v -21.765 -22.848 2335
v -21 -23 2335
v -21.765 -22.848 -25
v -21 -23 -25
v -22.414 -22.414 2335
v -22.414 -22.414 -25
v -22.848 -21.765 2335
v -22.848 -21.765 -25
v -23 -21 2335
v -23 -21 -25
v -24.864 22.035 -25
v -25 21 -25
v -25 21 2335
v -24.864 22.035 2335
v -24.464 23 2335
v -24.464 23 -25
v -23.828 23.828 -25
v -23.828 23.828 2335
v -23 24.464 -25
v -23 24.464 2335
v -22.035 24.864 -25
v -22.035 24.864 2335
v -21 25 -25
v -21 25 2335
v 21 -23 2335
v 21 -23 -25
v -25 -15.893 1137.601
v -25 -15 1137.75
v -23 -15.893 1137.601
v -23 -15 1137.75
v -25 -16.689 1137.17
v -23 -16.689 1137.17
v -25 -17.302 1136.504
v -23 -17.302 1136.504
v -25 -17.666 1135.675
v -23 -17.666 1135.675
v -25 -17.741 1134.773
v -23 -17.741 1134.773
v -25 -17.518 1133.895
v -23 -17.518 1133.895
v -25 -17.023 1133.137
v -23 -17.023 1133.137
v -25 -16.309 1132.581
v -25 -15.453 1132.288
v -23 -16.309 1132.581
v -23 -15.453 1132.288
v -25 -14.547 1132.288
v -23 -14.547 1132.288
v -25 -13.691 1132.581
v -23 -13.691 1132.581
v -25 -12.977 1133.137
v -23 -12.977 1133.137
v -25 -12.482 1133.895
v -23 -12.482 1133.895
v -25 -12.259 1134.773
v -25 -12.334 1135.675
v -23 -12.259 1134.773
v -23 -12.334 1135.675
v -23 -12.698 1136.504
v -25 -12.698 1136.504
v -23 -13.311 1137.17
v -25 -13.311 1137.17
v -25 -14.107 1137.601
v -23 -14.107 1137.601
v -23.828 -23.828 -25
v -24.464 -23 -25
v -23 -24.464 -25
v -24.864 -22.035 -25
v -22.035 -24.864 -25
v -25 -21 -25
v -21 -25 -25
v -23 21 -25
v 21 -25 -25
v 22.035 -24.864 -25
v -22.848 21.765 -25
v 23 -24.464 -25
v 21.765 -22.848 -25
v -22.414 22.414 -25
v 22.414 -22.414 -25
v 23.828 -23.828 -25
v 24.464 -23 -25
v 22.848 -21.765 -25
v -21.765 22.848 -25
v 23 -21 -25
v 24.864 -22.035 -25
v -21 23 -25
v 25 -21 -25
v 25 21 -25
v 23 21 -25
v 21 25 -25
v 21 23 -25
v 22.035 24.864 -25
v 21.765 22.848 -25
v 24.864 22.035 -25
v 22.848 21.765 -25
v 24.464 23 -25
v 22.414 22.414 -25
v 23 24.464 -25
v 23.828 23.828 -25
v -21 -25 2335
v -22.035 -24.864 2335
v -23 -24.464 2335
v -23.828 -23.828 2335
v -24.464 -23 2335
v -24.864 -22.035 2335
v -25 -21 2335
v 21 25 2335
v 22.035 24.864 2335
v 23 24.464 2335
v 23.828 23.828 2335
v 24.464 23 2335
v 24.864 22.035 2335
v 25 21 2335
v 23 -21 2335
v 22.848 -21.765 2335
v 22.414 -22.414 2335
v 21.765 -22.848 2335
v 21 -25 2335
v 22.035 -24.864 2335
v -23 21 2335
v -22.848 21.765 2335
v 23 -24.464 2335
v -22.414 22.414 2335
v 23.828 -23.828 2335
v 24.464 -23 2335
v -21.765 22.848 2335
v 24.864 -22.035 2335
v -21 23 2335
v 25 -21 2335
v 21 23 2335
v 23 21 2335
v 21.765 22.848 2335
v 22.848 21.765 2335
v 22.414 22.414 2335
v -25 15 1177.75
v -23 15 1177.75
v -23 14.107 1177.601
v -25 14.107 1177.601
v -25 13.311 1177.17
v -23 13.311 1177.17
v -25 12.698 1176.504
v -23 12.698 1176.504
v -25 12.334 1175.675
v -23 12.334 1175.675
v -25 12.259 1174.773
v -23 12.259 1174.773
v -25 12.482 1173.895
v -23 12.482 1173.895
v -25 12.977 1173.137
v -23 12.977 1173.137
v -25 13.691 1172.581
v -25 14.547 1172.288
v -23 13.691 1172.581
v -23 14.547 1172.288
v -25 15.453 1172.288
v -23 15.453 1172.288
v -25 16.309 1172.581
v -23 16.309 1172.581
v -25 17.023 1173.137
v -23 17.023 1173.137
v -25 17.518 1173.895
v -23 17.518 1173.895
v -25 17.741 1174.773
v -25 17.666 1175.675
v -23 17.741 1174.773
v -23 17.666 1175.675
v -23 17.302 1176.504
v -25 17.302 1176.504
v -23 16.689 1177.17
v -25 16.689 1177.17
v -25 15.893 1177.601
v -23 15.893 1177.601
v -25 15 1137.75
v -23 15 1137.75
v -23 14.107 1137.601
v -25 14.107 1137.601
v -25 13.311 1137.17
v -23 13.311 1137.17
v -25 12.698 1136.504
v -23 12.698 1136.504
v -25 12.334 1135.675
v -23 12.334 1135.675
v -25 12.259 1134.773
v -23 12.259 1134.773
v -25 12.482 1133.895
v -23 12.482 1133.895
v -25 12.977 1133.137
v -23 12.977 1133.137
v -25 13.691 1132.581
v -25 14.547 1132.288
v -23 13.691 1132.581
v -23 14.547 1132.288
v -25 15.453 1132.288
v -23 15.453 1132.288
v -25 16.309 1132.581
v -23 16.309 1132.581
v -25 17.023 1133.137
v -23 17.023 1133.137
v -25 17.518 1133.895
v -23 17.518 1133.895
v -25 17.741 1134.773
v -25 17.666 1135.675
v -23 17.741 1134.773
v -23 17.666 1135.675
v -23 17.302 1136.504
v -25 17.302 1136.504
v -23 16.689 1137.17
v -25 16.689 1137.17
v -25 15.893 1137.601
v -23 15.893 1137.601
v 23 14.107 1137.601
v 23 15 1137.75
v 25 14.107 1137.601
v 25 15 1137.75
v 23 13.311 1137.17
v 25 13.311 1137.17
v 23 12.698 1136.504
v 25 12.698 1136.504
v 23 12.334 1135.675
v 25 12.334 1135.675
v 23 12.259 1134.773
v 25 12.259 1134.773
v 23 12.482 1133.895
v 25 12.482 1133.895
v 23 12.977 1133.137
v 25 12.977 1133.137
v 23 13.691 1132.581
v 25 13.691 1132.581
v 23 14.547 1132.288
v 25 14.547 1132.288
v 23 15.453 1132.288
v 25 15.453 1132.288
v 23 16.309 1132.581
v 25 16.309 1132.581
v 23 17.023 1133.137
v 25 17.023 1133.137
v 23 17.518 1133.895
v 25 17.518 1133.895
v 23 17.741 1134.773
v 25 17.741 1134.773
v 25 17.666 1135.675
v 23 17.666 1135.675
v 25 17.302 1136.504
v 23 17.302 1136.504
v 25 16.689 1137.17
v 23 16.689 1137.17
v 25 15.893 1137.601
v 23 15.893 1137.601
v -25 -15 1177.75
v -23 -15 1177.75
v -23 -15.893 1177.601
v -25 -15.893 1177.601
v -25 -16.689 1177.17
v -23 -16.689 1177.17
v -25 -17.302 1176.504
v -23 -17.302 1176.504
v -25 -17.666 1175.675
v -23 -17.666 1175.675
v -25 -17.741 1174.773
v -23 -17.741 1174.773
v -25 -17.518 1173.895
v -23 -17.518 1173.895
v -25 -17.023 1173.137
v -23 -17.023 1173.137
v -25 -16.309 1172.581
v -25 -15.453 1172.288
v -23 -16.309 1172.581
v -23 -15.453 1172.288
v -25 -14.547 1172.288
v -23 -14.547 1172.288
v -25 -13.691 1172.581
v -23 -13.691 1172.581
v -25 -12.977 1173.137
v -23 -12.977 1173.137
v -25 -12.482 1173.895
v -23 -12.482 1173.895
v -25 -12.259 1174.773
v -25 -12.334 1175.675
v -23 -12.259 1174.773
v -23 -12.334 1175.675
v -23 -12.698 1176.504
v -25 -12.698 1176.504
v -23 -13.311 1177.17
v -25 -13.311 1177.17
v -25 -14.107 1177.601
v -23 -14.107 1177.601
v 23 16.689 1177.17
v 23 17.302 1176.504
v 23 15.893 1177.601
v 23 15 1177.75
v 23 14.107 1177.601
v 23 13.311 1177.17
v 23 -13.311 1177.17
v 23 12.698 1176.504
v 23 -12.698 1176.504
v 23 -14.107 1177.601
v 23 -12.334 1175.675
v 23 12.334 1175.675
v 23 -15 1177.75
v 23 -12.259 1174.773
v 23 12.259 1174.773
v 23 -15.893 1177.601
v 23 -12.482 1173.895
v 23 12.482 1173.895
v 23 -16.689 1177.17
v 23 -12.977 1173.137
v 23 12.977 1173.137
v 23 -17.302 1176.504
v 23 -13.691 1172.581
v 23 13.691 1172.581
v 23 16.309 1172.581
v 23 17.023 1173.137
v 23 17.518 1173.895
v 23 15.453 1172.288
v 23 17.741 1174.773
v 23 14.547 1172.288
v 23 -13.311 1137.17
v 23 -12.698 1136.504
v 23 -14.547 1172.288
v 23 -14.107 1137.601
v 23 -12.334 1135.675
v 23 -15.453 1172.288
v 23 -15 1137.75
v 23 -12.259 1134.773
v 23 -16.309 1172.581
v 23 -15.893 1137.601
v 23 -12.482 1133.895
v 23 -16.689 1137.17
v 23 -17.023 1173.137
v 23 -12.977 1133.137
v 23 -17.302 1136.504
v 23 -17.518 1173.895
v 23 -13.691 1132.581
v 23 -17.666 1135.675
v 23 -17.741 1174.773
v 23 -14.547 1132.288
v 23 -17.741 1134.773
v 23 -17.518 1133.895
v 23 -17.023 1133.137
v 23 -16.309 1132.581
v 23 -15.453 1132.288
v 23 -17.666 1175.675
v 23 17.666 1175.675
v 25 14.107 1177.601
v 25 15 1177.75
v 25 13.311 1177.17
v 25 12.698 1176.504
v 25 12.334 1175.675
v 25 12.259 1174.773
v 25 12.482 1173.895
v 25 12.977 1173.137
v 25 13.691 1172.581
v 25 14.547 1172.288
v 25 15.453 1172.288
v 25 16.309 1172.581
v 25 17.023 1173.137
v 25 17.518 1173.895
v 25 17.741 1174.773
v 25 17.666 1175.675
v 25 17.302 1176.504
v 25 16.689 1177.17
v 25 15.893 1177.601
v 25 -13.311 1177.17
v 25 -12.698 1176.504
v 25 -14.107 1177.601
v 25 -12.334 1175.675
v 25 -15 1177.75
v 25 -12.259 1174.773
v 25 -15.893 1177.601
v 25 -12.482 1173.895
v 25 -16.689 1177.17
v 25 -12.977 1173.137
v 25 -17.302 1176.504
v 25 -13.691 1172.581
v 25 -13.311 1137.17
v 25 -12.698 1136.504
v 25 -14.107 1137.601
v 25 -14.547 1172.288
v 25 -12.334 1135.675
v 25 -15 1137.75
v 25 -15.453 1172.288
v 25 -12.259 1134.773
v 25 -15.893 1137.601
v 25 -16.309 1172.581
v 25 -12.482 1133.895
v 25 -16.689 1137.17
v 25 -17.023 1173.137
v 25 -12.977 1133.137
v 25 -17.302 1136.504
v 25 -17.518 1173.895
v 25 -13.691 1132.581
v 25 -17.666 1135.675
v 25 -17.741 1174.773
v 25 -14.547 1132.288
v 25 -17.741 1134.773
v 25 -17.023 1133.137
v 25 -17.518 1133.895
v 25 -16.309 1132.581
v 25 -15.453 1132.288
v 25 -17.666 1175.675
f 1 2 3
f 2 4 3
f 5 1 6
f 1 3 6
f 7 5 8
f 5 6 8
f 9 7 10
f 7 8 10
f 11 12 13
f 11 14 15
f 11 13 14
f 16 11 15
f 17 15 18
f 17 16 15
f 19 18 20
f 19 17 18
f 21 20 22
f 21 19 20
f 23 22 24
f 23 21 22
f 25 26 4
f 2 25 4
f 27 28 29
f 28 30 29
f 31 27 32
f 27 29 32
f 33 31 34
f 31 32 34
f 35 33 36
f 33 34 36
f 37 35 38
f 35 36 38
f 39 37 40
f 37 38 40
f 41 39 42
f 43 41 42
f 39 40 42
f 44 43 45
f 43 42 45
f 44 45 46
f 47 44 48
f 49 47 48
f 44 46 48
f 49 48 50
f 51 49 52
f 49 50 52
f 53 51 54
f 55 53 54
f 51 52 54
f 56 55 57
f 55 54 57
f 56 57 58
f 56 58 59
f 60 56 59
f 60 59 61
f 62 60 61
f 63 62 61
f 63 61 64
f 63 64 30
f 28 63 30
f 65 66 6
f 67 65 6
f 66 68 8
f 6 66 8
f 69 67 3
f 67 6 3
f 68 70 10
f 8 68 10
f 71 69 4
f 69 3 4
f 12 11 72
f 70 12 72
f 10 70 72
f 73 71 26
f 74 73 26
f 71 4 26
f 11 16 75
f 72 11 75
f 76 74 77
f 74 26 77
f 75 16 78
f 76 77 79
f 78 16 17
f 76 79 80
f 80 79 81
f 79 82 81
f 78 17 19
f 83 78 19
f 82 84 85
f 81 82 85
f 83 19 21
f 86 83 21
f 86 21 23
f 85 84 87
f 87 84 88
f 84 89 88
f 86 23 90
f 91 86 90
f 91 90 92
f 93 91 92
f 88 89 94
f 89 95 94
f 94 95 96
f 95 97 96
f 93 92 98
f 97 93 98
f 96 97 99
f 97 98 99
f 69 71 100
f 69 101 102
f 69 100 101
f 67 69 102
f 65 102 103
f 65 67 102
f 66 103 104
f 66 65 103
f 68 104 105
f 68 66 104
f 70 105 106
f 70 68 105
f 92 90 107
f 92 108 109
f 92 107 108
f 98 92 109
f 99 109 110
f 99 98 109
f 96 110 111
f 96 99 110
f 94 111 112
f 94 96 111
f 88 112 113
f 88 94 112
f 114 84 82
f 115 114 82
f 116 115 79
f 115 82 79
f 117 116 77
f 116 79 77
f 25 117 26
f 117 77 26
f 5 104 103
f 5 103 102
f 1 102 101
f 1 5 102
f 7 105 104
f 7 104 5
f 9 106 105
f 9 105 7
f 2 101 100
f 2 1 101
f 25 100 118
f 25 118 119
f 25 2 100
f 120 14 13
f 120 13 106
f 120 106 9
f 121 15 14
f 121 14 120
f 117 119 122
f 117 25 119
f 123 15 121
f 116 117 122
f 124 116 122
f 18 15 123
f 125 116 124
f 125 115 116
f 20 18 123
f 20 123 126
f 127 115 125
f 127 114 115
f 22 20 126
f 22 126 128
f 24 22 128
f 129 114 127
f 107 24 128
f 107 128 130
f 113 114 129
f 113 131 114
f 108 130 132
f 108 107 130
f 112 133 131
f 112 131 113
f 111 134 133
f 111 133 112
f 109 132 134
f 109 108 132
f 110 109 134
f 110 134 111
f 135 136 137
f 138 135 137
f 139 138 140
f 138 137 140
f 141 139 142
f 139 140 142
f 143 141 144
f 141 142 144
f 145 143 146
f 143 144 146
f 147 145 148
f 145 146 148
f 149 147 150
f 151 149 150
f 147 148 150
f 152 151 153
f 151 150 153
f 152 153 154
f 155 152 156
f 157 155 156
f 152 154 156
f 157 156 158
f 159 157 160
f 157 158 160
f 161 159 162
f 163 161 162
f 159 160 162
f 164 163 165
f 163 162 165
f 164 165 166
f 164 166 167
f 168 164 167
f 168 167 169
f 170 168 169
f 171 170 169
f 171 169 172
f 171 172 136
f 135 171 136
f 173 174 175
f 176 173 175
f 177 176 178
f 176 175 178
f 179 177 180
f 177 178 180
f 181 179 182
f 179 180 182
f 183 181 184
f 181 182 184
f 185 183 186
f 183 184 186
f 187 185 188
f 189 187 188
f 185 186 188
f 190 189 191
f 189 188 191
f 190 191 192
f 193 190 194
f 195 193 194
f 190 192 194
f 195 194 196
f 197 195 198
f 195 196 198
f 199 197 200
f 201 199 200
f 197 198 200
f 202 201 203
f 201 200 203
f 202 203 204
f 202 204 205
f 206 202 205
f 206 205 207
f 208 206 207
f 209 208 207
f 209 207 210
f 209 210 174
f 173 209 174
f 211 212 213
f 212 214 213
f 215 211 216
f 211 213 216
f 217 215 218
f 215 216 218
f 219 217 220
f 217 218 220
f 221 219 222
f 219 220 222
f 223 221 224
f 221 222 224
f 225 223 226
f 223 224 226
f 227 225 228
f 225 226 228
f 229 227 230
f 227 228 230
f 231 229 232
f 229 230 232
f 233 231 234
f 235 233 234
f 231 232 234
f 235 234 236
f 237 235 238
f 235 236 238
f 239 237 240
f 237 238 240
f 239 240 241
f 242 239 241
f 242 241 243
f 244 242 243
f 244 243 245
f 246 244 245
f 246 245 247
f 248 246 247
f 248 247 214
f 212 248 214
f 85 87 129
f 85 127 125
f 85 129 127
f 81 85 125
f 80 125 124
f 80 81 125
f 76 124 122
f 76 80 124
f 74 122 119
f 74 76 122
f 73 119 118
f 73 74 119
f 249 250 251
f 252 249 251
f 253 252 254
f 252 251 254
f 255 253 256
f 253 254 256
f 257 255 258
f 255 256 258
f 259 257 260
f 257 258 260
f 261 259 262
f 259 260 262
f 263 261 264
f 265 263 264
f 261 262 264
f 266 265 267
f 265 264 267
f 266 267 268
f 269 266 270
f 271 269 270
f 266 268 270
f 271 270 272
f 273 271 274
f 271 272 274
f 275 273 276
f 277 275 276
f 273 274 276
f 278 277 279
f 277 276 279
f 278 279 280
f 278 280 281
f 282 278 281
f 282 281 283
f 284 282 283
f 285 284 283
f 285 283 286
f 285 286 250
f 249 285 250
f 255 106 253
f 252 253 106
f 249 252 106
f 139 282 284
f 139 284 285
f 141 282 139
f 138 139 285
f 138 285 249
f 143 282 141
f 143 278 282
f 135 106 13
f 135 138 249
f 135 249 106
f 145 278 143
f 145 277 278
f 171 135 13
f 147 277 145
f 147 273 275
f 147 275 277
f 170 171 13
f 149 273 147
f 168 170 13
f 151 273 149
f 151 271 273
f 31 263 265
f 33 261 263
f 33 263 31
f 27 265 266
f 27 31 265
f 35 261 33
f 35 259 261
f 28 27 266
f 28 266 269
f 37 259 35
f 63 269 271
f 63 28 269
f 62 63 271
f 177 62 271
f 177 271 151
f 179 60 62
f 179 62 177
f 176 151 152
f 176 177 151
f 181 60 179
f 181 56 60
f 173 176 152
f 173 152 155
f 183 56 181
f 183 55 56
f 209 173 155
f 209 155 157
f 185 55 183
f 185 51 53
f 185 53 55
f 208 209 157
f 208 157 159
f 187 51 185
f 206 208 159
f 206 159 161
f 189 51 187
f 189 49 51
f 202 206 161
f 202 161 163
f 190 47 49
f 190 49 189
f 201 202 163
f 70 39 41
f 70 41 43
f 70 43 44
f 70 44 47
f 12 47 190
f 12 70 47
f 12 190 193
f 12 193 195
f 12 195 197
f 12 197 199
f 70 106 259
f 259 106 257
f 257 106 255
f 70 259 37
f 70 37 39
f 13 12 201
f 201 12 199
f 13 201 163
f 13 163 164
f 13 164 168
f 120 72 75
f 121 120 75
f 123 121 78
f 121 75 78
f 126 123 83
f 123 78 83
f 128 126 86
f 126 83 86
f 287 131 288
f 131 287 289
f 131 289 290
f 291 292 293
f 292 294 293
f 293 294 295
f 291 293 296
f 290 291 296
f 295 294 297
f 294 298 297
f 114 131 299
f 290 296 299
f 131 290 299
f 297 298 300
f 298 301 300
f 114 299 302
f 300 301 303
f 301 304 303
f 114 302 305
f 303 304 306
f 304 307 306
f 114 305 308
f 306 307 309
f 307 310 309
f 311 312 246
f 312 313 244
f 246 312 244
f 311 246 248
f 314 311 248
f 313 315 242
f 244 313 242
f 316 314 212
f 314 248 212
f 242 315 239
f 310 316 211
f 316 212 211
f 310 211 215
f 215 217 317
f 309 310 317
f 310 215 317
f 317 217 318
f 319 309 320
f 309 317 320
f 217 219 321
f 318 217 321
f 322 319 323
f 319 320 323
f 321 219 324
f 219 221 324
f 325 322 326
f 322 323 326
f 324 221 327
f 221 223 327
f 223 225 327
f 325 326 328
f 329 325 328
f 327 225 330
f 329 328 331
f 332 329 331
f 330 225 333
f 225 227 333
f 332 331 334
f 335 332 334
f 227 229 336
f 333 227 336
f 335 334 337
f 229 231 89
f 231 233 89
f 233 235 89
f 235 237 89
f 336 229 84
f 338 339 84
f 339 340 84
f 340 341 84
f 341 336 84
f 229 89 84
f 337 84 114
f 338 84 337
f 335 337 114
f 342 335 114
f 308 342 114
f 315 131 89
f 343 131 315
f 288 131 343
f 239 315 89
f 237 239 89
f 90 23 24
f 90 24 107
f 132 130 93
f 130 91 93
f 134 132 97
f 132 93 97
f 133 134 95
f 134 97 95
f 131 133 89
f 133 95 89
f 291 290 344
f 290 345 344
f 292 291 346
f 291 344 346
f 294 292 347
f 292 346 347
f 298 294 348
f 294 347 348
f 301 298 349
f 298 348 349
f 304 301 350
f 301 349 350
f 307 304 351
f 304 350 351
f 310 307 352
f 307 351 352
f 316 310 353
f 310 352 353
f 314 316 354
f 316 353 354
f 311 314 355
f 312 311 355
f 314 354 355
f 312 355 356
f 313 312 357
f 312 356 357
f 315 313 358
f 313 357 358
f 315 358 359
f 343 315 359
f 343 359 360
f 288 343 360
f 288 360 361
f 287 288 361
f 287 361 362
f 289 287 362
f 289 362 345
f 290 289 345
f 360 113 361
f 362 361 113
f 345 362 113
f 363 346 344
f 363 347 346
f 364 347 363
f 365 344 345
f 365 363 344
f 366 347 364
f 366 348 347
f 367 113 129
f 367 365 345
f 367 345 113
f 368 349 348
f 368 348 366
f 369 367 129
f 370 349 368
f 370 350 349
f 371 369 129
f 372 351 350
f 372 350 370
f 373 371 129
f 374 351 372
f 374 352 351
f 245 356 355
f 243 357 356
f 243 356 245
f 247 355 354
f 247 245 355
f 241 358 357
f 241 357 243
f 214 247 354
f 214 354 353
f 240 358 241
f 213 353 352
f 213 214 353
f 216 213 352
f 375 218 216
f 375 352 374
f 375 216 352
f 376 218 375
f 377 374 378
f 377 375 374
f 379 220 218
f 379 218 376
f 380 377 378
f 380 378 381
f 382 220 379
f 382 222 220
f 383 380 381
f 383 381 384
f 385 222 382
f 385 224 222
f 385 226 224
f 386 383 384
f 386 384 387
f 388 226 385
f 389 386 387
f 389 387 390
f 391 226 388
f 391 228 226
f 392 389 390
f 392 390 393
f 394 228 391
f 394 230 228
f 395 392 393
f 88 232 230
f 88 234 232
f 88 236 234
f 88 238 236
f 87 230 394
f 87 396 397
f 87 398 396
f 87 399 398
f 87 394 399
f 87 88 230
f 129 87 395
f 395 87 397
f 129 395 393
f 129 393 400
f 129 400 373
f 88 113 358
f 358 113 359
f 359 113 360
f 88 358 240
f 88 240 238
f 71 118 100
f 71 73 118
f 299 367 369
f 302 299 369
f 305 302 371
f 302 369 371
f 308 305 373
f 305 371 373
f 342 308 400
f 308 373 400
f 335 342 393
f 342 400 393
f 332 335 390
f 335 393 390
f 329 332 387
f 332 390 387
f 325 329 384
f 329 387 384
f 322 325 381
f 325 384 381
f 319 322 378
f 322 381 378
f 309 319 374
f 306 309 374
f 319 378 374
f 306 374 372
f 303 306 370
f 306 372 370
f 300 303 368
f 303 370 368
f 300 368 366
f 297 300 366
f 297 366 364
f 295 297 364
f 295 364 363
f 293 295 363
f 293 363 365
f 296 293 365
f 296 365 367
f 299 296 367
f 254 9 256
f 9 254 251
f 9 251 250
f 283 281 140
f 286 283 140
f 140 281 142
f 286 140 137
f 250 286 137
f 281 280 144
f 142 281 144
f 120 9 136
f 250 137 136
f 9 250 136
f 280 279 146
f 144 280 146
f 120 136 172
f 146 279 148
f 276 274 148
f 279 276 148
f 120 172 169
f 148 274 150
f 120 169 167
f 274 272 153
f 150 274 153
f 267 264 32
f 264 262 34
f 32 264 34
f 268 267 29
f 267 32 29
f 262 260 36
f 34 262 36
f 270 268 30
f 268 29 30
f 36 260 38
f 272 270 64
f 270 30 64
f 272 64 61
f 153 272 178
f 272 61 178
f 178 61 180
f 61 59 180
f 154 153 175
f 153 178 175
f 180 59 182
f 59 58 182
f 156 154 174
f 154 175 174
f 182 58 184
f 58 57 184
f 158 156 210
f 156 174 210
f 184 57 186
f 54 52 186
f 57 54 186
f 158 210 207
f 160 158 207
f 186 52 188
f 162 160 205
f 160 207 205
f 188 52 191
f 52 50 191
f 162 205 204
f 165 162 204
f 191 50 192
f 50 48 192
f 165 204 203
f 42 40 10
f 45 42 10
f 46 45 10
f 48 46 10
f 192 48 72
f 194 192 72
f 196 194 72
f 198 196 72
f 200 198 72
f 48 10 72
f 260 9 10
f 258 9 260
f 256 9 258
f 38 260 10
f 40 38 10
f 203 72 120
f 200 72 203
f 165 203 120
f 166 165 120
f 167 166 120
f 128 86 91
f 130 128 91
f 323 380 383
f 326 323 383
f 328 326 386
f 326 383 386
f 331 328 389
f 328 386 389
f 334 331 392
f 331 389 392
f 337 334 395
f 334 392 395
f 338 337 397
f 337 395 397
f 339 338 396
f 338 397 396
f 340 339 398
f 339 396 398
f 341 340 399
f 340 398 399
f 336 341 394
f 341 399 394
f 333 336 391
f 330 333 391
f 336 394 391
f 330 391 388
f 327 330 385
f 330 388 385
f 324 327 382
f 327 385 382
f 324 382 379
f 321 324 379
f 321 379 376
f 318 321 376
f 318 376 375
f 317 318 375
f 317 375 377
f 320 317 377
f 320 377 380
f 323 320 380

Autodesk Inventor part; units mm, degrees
ref_plane "Start plane" through (0, 0, -25) normal (0, 0, 1) x (1, 0, 0)
ref_plane "End plane" through (0, 0, 2335) normal (0, 0, 1) x (1, 0, 0)
sketch "Sketch" plane through (0, 0, 0) normal (0, 0, 1) x (1, 0, 0)
  line L0 (-25, -21) -> (-25, 21)
  line L1 (-21, 25) -> (21, 25)
  line L2 (25, 21) -> (25, -21)
  line L3 (21, -25) -> (-21, -25)
  arc A0 (-25, -21) -> (-21, -25) centre (-21, -21) ccw
  arc A1 (25, 21) -> (21, 25) centre (21, 21) ccw
  arc A2 (-21, 25) -> (-25, 21) centre (-21, 21) ccw
  arc A3 (21, -25) -> (25, -21) centre (21, -21) ccw
  arc A4 (-21, 23) -> (-23, 21) centre (-21, 21) ccw
  line L4 (-21, 23) -> (21, 23)
  arc A5 (23, 21) -> (21, 23) centre (21, 21) ccw
  line L5 (23, 21) -> (23, -21)
  arc A6 (21, -23) -> (23, -21) centre (21, -21) ccw
  line L6 (21, -23) -> (-21, -23)
  arc A7 (-23, -21) -> (-21, -23) centre (-21, -21) ccw
  line L7 (-23, -21) -> (-23, 21)
  line L8 (0, 36.4497) -> (0, -36.4497) construction
  line L9 (-36.4497, 0) -> (36.4497, 0) construction
  dimension "d7" = 4
  dimension "d9" = 50
  dimension "d11" = 50
  dimension "d12" = 2
  dimension "d15" = 25
  dimension "d16" = 25
extrude "Body" add sketch "Sketch" along normal up to surface (2360 mm away) from surface at -25
sketch "Sketch3" plane through (0, 0, 0) normal (0, 0, 1) x (1, 0, 0)
  line L0 (0, 0) -> (10, 0)
ref_plane "Work Plane3" through (0, 0, 0) normal (0, -1, 0) x (1, 0, 0)
sketch "Sketch4" plane through (0, 0, 0) normal (0, -1, 0) x (1, 0, 0)
  line L0 (-2, -25) -> (12, -25)
  line L1 (-2, 2335) -> (12, 2335)
  dimension "d18" = 2360
ref_plane "Work Plane4" through (0, 21, -25) normal (0, 0, -1) x (-1, 0, 0)
split "Split1" plane through (0, 21, -25) removes the side toward (0, 0, -1)
ref_plane "Work Plane5" through (0, -21, 2335) normal (0, 0, 1) x (1, 0, 0)
split "Split2" plane through (0, -21, 2335) removes the side toward (0, 0, 1)
sketch "Sketch6" plane through (-25, 21, -25) normal (-1, 0, 0) x (0, 0, 1)
  line L0 (2360, 0) -> (0, 0) projected
  line L1 (0, 0) -> (2360, 0) projected
  line L2 (1180, 0) -> (1180, -42)
  line L3 (1160, -6) -> (1200, -6)
  line L4 (1200, -6) -> (1200, -36)
  line L5 (1200, -36) -> (1160, -36)
  line L6 (1160, -36) -> (1160, -6)
  line L7 (2360, -42) -> (0, -42) projected
  line L8 (1180, -21) -> (1190.0691, -21)
  point P0 (25, -21)
  dimension "d19" = 40
  dimension "d20" = 30
hole "Hole1" at (-25, 15, 1135) at (-25, -15, 1135) at (-25, -15, 1175) at (-25, 15, 1175) direction (1, 0, 0) diameter 5.5 end through all
equation "\"d7\" = G_IR"
equation "\"d9\" = G_W"
equation "\"d11\" = G_H"
equation "\"d12\" = G_T"
equation "\"d15\" = 0.5 * d9"
equation "\"d16\" = 0.5 * d11"
equation "\"d3\" = G_L"
equation "\"G_W\" = 50"
equation "\"G_H\" = 50"
equation "\"G_T\" = 2"
equation "\"G_IR\" = 4"
equation "\"G_L\" = d18"
equation "\"G_OFFSET_START\" = 25"
equation "\"G_OFFSET_END\" = 25"
equation "\"d13\" = -G_OFFSET_START"
equation "\"d14\" = G_OFFSET_END + B_L"
equation "\"B_L\" = 2310"
properties part number "ISO 10799-2 - 50x50x2 - 2360" material "Steel, Galvanized"
